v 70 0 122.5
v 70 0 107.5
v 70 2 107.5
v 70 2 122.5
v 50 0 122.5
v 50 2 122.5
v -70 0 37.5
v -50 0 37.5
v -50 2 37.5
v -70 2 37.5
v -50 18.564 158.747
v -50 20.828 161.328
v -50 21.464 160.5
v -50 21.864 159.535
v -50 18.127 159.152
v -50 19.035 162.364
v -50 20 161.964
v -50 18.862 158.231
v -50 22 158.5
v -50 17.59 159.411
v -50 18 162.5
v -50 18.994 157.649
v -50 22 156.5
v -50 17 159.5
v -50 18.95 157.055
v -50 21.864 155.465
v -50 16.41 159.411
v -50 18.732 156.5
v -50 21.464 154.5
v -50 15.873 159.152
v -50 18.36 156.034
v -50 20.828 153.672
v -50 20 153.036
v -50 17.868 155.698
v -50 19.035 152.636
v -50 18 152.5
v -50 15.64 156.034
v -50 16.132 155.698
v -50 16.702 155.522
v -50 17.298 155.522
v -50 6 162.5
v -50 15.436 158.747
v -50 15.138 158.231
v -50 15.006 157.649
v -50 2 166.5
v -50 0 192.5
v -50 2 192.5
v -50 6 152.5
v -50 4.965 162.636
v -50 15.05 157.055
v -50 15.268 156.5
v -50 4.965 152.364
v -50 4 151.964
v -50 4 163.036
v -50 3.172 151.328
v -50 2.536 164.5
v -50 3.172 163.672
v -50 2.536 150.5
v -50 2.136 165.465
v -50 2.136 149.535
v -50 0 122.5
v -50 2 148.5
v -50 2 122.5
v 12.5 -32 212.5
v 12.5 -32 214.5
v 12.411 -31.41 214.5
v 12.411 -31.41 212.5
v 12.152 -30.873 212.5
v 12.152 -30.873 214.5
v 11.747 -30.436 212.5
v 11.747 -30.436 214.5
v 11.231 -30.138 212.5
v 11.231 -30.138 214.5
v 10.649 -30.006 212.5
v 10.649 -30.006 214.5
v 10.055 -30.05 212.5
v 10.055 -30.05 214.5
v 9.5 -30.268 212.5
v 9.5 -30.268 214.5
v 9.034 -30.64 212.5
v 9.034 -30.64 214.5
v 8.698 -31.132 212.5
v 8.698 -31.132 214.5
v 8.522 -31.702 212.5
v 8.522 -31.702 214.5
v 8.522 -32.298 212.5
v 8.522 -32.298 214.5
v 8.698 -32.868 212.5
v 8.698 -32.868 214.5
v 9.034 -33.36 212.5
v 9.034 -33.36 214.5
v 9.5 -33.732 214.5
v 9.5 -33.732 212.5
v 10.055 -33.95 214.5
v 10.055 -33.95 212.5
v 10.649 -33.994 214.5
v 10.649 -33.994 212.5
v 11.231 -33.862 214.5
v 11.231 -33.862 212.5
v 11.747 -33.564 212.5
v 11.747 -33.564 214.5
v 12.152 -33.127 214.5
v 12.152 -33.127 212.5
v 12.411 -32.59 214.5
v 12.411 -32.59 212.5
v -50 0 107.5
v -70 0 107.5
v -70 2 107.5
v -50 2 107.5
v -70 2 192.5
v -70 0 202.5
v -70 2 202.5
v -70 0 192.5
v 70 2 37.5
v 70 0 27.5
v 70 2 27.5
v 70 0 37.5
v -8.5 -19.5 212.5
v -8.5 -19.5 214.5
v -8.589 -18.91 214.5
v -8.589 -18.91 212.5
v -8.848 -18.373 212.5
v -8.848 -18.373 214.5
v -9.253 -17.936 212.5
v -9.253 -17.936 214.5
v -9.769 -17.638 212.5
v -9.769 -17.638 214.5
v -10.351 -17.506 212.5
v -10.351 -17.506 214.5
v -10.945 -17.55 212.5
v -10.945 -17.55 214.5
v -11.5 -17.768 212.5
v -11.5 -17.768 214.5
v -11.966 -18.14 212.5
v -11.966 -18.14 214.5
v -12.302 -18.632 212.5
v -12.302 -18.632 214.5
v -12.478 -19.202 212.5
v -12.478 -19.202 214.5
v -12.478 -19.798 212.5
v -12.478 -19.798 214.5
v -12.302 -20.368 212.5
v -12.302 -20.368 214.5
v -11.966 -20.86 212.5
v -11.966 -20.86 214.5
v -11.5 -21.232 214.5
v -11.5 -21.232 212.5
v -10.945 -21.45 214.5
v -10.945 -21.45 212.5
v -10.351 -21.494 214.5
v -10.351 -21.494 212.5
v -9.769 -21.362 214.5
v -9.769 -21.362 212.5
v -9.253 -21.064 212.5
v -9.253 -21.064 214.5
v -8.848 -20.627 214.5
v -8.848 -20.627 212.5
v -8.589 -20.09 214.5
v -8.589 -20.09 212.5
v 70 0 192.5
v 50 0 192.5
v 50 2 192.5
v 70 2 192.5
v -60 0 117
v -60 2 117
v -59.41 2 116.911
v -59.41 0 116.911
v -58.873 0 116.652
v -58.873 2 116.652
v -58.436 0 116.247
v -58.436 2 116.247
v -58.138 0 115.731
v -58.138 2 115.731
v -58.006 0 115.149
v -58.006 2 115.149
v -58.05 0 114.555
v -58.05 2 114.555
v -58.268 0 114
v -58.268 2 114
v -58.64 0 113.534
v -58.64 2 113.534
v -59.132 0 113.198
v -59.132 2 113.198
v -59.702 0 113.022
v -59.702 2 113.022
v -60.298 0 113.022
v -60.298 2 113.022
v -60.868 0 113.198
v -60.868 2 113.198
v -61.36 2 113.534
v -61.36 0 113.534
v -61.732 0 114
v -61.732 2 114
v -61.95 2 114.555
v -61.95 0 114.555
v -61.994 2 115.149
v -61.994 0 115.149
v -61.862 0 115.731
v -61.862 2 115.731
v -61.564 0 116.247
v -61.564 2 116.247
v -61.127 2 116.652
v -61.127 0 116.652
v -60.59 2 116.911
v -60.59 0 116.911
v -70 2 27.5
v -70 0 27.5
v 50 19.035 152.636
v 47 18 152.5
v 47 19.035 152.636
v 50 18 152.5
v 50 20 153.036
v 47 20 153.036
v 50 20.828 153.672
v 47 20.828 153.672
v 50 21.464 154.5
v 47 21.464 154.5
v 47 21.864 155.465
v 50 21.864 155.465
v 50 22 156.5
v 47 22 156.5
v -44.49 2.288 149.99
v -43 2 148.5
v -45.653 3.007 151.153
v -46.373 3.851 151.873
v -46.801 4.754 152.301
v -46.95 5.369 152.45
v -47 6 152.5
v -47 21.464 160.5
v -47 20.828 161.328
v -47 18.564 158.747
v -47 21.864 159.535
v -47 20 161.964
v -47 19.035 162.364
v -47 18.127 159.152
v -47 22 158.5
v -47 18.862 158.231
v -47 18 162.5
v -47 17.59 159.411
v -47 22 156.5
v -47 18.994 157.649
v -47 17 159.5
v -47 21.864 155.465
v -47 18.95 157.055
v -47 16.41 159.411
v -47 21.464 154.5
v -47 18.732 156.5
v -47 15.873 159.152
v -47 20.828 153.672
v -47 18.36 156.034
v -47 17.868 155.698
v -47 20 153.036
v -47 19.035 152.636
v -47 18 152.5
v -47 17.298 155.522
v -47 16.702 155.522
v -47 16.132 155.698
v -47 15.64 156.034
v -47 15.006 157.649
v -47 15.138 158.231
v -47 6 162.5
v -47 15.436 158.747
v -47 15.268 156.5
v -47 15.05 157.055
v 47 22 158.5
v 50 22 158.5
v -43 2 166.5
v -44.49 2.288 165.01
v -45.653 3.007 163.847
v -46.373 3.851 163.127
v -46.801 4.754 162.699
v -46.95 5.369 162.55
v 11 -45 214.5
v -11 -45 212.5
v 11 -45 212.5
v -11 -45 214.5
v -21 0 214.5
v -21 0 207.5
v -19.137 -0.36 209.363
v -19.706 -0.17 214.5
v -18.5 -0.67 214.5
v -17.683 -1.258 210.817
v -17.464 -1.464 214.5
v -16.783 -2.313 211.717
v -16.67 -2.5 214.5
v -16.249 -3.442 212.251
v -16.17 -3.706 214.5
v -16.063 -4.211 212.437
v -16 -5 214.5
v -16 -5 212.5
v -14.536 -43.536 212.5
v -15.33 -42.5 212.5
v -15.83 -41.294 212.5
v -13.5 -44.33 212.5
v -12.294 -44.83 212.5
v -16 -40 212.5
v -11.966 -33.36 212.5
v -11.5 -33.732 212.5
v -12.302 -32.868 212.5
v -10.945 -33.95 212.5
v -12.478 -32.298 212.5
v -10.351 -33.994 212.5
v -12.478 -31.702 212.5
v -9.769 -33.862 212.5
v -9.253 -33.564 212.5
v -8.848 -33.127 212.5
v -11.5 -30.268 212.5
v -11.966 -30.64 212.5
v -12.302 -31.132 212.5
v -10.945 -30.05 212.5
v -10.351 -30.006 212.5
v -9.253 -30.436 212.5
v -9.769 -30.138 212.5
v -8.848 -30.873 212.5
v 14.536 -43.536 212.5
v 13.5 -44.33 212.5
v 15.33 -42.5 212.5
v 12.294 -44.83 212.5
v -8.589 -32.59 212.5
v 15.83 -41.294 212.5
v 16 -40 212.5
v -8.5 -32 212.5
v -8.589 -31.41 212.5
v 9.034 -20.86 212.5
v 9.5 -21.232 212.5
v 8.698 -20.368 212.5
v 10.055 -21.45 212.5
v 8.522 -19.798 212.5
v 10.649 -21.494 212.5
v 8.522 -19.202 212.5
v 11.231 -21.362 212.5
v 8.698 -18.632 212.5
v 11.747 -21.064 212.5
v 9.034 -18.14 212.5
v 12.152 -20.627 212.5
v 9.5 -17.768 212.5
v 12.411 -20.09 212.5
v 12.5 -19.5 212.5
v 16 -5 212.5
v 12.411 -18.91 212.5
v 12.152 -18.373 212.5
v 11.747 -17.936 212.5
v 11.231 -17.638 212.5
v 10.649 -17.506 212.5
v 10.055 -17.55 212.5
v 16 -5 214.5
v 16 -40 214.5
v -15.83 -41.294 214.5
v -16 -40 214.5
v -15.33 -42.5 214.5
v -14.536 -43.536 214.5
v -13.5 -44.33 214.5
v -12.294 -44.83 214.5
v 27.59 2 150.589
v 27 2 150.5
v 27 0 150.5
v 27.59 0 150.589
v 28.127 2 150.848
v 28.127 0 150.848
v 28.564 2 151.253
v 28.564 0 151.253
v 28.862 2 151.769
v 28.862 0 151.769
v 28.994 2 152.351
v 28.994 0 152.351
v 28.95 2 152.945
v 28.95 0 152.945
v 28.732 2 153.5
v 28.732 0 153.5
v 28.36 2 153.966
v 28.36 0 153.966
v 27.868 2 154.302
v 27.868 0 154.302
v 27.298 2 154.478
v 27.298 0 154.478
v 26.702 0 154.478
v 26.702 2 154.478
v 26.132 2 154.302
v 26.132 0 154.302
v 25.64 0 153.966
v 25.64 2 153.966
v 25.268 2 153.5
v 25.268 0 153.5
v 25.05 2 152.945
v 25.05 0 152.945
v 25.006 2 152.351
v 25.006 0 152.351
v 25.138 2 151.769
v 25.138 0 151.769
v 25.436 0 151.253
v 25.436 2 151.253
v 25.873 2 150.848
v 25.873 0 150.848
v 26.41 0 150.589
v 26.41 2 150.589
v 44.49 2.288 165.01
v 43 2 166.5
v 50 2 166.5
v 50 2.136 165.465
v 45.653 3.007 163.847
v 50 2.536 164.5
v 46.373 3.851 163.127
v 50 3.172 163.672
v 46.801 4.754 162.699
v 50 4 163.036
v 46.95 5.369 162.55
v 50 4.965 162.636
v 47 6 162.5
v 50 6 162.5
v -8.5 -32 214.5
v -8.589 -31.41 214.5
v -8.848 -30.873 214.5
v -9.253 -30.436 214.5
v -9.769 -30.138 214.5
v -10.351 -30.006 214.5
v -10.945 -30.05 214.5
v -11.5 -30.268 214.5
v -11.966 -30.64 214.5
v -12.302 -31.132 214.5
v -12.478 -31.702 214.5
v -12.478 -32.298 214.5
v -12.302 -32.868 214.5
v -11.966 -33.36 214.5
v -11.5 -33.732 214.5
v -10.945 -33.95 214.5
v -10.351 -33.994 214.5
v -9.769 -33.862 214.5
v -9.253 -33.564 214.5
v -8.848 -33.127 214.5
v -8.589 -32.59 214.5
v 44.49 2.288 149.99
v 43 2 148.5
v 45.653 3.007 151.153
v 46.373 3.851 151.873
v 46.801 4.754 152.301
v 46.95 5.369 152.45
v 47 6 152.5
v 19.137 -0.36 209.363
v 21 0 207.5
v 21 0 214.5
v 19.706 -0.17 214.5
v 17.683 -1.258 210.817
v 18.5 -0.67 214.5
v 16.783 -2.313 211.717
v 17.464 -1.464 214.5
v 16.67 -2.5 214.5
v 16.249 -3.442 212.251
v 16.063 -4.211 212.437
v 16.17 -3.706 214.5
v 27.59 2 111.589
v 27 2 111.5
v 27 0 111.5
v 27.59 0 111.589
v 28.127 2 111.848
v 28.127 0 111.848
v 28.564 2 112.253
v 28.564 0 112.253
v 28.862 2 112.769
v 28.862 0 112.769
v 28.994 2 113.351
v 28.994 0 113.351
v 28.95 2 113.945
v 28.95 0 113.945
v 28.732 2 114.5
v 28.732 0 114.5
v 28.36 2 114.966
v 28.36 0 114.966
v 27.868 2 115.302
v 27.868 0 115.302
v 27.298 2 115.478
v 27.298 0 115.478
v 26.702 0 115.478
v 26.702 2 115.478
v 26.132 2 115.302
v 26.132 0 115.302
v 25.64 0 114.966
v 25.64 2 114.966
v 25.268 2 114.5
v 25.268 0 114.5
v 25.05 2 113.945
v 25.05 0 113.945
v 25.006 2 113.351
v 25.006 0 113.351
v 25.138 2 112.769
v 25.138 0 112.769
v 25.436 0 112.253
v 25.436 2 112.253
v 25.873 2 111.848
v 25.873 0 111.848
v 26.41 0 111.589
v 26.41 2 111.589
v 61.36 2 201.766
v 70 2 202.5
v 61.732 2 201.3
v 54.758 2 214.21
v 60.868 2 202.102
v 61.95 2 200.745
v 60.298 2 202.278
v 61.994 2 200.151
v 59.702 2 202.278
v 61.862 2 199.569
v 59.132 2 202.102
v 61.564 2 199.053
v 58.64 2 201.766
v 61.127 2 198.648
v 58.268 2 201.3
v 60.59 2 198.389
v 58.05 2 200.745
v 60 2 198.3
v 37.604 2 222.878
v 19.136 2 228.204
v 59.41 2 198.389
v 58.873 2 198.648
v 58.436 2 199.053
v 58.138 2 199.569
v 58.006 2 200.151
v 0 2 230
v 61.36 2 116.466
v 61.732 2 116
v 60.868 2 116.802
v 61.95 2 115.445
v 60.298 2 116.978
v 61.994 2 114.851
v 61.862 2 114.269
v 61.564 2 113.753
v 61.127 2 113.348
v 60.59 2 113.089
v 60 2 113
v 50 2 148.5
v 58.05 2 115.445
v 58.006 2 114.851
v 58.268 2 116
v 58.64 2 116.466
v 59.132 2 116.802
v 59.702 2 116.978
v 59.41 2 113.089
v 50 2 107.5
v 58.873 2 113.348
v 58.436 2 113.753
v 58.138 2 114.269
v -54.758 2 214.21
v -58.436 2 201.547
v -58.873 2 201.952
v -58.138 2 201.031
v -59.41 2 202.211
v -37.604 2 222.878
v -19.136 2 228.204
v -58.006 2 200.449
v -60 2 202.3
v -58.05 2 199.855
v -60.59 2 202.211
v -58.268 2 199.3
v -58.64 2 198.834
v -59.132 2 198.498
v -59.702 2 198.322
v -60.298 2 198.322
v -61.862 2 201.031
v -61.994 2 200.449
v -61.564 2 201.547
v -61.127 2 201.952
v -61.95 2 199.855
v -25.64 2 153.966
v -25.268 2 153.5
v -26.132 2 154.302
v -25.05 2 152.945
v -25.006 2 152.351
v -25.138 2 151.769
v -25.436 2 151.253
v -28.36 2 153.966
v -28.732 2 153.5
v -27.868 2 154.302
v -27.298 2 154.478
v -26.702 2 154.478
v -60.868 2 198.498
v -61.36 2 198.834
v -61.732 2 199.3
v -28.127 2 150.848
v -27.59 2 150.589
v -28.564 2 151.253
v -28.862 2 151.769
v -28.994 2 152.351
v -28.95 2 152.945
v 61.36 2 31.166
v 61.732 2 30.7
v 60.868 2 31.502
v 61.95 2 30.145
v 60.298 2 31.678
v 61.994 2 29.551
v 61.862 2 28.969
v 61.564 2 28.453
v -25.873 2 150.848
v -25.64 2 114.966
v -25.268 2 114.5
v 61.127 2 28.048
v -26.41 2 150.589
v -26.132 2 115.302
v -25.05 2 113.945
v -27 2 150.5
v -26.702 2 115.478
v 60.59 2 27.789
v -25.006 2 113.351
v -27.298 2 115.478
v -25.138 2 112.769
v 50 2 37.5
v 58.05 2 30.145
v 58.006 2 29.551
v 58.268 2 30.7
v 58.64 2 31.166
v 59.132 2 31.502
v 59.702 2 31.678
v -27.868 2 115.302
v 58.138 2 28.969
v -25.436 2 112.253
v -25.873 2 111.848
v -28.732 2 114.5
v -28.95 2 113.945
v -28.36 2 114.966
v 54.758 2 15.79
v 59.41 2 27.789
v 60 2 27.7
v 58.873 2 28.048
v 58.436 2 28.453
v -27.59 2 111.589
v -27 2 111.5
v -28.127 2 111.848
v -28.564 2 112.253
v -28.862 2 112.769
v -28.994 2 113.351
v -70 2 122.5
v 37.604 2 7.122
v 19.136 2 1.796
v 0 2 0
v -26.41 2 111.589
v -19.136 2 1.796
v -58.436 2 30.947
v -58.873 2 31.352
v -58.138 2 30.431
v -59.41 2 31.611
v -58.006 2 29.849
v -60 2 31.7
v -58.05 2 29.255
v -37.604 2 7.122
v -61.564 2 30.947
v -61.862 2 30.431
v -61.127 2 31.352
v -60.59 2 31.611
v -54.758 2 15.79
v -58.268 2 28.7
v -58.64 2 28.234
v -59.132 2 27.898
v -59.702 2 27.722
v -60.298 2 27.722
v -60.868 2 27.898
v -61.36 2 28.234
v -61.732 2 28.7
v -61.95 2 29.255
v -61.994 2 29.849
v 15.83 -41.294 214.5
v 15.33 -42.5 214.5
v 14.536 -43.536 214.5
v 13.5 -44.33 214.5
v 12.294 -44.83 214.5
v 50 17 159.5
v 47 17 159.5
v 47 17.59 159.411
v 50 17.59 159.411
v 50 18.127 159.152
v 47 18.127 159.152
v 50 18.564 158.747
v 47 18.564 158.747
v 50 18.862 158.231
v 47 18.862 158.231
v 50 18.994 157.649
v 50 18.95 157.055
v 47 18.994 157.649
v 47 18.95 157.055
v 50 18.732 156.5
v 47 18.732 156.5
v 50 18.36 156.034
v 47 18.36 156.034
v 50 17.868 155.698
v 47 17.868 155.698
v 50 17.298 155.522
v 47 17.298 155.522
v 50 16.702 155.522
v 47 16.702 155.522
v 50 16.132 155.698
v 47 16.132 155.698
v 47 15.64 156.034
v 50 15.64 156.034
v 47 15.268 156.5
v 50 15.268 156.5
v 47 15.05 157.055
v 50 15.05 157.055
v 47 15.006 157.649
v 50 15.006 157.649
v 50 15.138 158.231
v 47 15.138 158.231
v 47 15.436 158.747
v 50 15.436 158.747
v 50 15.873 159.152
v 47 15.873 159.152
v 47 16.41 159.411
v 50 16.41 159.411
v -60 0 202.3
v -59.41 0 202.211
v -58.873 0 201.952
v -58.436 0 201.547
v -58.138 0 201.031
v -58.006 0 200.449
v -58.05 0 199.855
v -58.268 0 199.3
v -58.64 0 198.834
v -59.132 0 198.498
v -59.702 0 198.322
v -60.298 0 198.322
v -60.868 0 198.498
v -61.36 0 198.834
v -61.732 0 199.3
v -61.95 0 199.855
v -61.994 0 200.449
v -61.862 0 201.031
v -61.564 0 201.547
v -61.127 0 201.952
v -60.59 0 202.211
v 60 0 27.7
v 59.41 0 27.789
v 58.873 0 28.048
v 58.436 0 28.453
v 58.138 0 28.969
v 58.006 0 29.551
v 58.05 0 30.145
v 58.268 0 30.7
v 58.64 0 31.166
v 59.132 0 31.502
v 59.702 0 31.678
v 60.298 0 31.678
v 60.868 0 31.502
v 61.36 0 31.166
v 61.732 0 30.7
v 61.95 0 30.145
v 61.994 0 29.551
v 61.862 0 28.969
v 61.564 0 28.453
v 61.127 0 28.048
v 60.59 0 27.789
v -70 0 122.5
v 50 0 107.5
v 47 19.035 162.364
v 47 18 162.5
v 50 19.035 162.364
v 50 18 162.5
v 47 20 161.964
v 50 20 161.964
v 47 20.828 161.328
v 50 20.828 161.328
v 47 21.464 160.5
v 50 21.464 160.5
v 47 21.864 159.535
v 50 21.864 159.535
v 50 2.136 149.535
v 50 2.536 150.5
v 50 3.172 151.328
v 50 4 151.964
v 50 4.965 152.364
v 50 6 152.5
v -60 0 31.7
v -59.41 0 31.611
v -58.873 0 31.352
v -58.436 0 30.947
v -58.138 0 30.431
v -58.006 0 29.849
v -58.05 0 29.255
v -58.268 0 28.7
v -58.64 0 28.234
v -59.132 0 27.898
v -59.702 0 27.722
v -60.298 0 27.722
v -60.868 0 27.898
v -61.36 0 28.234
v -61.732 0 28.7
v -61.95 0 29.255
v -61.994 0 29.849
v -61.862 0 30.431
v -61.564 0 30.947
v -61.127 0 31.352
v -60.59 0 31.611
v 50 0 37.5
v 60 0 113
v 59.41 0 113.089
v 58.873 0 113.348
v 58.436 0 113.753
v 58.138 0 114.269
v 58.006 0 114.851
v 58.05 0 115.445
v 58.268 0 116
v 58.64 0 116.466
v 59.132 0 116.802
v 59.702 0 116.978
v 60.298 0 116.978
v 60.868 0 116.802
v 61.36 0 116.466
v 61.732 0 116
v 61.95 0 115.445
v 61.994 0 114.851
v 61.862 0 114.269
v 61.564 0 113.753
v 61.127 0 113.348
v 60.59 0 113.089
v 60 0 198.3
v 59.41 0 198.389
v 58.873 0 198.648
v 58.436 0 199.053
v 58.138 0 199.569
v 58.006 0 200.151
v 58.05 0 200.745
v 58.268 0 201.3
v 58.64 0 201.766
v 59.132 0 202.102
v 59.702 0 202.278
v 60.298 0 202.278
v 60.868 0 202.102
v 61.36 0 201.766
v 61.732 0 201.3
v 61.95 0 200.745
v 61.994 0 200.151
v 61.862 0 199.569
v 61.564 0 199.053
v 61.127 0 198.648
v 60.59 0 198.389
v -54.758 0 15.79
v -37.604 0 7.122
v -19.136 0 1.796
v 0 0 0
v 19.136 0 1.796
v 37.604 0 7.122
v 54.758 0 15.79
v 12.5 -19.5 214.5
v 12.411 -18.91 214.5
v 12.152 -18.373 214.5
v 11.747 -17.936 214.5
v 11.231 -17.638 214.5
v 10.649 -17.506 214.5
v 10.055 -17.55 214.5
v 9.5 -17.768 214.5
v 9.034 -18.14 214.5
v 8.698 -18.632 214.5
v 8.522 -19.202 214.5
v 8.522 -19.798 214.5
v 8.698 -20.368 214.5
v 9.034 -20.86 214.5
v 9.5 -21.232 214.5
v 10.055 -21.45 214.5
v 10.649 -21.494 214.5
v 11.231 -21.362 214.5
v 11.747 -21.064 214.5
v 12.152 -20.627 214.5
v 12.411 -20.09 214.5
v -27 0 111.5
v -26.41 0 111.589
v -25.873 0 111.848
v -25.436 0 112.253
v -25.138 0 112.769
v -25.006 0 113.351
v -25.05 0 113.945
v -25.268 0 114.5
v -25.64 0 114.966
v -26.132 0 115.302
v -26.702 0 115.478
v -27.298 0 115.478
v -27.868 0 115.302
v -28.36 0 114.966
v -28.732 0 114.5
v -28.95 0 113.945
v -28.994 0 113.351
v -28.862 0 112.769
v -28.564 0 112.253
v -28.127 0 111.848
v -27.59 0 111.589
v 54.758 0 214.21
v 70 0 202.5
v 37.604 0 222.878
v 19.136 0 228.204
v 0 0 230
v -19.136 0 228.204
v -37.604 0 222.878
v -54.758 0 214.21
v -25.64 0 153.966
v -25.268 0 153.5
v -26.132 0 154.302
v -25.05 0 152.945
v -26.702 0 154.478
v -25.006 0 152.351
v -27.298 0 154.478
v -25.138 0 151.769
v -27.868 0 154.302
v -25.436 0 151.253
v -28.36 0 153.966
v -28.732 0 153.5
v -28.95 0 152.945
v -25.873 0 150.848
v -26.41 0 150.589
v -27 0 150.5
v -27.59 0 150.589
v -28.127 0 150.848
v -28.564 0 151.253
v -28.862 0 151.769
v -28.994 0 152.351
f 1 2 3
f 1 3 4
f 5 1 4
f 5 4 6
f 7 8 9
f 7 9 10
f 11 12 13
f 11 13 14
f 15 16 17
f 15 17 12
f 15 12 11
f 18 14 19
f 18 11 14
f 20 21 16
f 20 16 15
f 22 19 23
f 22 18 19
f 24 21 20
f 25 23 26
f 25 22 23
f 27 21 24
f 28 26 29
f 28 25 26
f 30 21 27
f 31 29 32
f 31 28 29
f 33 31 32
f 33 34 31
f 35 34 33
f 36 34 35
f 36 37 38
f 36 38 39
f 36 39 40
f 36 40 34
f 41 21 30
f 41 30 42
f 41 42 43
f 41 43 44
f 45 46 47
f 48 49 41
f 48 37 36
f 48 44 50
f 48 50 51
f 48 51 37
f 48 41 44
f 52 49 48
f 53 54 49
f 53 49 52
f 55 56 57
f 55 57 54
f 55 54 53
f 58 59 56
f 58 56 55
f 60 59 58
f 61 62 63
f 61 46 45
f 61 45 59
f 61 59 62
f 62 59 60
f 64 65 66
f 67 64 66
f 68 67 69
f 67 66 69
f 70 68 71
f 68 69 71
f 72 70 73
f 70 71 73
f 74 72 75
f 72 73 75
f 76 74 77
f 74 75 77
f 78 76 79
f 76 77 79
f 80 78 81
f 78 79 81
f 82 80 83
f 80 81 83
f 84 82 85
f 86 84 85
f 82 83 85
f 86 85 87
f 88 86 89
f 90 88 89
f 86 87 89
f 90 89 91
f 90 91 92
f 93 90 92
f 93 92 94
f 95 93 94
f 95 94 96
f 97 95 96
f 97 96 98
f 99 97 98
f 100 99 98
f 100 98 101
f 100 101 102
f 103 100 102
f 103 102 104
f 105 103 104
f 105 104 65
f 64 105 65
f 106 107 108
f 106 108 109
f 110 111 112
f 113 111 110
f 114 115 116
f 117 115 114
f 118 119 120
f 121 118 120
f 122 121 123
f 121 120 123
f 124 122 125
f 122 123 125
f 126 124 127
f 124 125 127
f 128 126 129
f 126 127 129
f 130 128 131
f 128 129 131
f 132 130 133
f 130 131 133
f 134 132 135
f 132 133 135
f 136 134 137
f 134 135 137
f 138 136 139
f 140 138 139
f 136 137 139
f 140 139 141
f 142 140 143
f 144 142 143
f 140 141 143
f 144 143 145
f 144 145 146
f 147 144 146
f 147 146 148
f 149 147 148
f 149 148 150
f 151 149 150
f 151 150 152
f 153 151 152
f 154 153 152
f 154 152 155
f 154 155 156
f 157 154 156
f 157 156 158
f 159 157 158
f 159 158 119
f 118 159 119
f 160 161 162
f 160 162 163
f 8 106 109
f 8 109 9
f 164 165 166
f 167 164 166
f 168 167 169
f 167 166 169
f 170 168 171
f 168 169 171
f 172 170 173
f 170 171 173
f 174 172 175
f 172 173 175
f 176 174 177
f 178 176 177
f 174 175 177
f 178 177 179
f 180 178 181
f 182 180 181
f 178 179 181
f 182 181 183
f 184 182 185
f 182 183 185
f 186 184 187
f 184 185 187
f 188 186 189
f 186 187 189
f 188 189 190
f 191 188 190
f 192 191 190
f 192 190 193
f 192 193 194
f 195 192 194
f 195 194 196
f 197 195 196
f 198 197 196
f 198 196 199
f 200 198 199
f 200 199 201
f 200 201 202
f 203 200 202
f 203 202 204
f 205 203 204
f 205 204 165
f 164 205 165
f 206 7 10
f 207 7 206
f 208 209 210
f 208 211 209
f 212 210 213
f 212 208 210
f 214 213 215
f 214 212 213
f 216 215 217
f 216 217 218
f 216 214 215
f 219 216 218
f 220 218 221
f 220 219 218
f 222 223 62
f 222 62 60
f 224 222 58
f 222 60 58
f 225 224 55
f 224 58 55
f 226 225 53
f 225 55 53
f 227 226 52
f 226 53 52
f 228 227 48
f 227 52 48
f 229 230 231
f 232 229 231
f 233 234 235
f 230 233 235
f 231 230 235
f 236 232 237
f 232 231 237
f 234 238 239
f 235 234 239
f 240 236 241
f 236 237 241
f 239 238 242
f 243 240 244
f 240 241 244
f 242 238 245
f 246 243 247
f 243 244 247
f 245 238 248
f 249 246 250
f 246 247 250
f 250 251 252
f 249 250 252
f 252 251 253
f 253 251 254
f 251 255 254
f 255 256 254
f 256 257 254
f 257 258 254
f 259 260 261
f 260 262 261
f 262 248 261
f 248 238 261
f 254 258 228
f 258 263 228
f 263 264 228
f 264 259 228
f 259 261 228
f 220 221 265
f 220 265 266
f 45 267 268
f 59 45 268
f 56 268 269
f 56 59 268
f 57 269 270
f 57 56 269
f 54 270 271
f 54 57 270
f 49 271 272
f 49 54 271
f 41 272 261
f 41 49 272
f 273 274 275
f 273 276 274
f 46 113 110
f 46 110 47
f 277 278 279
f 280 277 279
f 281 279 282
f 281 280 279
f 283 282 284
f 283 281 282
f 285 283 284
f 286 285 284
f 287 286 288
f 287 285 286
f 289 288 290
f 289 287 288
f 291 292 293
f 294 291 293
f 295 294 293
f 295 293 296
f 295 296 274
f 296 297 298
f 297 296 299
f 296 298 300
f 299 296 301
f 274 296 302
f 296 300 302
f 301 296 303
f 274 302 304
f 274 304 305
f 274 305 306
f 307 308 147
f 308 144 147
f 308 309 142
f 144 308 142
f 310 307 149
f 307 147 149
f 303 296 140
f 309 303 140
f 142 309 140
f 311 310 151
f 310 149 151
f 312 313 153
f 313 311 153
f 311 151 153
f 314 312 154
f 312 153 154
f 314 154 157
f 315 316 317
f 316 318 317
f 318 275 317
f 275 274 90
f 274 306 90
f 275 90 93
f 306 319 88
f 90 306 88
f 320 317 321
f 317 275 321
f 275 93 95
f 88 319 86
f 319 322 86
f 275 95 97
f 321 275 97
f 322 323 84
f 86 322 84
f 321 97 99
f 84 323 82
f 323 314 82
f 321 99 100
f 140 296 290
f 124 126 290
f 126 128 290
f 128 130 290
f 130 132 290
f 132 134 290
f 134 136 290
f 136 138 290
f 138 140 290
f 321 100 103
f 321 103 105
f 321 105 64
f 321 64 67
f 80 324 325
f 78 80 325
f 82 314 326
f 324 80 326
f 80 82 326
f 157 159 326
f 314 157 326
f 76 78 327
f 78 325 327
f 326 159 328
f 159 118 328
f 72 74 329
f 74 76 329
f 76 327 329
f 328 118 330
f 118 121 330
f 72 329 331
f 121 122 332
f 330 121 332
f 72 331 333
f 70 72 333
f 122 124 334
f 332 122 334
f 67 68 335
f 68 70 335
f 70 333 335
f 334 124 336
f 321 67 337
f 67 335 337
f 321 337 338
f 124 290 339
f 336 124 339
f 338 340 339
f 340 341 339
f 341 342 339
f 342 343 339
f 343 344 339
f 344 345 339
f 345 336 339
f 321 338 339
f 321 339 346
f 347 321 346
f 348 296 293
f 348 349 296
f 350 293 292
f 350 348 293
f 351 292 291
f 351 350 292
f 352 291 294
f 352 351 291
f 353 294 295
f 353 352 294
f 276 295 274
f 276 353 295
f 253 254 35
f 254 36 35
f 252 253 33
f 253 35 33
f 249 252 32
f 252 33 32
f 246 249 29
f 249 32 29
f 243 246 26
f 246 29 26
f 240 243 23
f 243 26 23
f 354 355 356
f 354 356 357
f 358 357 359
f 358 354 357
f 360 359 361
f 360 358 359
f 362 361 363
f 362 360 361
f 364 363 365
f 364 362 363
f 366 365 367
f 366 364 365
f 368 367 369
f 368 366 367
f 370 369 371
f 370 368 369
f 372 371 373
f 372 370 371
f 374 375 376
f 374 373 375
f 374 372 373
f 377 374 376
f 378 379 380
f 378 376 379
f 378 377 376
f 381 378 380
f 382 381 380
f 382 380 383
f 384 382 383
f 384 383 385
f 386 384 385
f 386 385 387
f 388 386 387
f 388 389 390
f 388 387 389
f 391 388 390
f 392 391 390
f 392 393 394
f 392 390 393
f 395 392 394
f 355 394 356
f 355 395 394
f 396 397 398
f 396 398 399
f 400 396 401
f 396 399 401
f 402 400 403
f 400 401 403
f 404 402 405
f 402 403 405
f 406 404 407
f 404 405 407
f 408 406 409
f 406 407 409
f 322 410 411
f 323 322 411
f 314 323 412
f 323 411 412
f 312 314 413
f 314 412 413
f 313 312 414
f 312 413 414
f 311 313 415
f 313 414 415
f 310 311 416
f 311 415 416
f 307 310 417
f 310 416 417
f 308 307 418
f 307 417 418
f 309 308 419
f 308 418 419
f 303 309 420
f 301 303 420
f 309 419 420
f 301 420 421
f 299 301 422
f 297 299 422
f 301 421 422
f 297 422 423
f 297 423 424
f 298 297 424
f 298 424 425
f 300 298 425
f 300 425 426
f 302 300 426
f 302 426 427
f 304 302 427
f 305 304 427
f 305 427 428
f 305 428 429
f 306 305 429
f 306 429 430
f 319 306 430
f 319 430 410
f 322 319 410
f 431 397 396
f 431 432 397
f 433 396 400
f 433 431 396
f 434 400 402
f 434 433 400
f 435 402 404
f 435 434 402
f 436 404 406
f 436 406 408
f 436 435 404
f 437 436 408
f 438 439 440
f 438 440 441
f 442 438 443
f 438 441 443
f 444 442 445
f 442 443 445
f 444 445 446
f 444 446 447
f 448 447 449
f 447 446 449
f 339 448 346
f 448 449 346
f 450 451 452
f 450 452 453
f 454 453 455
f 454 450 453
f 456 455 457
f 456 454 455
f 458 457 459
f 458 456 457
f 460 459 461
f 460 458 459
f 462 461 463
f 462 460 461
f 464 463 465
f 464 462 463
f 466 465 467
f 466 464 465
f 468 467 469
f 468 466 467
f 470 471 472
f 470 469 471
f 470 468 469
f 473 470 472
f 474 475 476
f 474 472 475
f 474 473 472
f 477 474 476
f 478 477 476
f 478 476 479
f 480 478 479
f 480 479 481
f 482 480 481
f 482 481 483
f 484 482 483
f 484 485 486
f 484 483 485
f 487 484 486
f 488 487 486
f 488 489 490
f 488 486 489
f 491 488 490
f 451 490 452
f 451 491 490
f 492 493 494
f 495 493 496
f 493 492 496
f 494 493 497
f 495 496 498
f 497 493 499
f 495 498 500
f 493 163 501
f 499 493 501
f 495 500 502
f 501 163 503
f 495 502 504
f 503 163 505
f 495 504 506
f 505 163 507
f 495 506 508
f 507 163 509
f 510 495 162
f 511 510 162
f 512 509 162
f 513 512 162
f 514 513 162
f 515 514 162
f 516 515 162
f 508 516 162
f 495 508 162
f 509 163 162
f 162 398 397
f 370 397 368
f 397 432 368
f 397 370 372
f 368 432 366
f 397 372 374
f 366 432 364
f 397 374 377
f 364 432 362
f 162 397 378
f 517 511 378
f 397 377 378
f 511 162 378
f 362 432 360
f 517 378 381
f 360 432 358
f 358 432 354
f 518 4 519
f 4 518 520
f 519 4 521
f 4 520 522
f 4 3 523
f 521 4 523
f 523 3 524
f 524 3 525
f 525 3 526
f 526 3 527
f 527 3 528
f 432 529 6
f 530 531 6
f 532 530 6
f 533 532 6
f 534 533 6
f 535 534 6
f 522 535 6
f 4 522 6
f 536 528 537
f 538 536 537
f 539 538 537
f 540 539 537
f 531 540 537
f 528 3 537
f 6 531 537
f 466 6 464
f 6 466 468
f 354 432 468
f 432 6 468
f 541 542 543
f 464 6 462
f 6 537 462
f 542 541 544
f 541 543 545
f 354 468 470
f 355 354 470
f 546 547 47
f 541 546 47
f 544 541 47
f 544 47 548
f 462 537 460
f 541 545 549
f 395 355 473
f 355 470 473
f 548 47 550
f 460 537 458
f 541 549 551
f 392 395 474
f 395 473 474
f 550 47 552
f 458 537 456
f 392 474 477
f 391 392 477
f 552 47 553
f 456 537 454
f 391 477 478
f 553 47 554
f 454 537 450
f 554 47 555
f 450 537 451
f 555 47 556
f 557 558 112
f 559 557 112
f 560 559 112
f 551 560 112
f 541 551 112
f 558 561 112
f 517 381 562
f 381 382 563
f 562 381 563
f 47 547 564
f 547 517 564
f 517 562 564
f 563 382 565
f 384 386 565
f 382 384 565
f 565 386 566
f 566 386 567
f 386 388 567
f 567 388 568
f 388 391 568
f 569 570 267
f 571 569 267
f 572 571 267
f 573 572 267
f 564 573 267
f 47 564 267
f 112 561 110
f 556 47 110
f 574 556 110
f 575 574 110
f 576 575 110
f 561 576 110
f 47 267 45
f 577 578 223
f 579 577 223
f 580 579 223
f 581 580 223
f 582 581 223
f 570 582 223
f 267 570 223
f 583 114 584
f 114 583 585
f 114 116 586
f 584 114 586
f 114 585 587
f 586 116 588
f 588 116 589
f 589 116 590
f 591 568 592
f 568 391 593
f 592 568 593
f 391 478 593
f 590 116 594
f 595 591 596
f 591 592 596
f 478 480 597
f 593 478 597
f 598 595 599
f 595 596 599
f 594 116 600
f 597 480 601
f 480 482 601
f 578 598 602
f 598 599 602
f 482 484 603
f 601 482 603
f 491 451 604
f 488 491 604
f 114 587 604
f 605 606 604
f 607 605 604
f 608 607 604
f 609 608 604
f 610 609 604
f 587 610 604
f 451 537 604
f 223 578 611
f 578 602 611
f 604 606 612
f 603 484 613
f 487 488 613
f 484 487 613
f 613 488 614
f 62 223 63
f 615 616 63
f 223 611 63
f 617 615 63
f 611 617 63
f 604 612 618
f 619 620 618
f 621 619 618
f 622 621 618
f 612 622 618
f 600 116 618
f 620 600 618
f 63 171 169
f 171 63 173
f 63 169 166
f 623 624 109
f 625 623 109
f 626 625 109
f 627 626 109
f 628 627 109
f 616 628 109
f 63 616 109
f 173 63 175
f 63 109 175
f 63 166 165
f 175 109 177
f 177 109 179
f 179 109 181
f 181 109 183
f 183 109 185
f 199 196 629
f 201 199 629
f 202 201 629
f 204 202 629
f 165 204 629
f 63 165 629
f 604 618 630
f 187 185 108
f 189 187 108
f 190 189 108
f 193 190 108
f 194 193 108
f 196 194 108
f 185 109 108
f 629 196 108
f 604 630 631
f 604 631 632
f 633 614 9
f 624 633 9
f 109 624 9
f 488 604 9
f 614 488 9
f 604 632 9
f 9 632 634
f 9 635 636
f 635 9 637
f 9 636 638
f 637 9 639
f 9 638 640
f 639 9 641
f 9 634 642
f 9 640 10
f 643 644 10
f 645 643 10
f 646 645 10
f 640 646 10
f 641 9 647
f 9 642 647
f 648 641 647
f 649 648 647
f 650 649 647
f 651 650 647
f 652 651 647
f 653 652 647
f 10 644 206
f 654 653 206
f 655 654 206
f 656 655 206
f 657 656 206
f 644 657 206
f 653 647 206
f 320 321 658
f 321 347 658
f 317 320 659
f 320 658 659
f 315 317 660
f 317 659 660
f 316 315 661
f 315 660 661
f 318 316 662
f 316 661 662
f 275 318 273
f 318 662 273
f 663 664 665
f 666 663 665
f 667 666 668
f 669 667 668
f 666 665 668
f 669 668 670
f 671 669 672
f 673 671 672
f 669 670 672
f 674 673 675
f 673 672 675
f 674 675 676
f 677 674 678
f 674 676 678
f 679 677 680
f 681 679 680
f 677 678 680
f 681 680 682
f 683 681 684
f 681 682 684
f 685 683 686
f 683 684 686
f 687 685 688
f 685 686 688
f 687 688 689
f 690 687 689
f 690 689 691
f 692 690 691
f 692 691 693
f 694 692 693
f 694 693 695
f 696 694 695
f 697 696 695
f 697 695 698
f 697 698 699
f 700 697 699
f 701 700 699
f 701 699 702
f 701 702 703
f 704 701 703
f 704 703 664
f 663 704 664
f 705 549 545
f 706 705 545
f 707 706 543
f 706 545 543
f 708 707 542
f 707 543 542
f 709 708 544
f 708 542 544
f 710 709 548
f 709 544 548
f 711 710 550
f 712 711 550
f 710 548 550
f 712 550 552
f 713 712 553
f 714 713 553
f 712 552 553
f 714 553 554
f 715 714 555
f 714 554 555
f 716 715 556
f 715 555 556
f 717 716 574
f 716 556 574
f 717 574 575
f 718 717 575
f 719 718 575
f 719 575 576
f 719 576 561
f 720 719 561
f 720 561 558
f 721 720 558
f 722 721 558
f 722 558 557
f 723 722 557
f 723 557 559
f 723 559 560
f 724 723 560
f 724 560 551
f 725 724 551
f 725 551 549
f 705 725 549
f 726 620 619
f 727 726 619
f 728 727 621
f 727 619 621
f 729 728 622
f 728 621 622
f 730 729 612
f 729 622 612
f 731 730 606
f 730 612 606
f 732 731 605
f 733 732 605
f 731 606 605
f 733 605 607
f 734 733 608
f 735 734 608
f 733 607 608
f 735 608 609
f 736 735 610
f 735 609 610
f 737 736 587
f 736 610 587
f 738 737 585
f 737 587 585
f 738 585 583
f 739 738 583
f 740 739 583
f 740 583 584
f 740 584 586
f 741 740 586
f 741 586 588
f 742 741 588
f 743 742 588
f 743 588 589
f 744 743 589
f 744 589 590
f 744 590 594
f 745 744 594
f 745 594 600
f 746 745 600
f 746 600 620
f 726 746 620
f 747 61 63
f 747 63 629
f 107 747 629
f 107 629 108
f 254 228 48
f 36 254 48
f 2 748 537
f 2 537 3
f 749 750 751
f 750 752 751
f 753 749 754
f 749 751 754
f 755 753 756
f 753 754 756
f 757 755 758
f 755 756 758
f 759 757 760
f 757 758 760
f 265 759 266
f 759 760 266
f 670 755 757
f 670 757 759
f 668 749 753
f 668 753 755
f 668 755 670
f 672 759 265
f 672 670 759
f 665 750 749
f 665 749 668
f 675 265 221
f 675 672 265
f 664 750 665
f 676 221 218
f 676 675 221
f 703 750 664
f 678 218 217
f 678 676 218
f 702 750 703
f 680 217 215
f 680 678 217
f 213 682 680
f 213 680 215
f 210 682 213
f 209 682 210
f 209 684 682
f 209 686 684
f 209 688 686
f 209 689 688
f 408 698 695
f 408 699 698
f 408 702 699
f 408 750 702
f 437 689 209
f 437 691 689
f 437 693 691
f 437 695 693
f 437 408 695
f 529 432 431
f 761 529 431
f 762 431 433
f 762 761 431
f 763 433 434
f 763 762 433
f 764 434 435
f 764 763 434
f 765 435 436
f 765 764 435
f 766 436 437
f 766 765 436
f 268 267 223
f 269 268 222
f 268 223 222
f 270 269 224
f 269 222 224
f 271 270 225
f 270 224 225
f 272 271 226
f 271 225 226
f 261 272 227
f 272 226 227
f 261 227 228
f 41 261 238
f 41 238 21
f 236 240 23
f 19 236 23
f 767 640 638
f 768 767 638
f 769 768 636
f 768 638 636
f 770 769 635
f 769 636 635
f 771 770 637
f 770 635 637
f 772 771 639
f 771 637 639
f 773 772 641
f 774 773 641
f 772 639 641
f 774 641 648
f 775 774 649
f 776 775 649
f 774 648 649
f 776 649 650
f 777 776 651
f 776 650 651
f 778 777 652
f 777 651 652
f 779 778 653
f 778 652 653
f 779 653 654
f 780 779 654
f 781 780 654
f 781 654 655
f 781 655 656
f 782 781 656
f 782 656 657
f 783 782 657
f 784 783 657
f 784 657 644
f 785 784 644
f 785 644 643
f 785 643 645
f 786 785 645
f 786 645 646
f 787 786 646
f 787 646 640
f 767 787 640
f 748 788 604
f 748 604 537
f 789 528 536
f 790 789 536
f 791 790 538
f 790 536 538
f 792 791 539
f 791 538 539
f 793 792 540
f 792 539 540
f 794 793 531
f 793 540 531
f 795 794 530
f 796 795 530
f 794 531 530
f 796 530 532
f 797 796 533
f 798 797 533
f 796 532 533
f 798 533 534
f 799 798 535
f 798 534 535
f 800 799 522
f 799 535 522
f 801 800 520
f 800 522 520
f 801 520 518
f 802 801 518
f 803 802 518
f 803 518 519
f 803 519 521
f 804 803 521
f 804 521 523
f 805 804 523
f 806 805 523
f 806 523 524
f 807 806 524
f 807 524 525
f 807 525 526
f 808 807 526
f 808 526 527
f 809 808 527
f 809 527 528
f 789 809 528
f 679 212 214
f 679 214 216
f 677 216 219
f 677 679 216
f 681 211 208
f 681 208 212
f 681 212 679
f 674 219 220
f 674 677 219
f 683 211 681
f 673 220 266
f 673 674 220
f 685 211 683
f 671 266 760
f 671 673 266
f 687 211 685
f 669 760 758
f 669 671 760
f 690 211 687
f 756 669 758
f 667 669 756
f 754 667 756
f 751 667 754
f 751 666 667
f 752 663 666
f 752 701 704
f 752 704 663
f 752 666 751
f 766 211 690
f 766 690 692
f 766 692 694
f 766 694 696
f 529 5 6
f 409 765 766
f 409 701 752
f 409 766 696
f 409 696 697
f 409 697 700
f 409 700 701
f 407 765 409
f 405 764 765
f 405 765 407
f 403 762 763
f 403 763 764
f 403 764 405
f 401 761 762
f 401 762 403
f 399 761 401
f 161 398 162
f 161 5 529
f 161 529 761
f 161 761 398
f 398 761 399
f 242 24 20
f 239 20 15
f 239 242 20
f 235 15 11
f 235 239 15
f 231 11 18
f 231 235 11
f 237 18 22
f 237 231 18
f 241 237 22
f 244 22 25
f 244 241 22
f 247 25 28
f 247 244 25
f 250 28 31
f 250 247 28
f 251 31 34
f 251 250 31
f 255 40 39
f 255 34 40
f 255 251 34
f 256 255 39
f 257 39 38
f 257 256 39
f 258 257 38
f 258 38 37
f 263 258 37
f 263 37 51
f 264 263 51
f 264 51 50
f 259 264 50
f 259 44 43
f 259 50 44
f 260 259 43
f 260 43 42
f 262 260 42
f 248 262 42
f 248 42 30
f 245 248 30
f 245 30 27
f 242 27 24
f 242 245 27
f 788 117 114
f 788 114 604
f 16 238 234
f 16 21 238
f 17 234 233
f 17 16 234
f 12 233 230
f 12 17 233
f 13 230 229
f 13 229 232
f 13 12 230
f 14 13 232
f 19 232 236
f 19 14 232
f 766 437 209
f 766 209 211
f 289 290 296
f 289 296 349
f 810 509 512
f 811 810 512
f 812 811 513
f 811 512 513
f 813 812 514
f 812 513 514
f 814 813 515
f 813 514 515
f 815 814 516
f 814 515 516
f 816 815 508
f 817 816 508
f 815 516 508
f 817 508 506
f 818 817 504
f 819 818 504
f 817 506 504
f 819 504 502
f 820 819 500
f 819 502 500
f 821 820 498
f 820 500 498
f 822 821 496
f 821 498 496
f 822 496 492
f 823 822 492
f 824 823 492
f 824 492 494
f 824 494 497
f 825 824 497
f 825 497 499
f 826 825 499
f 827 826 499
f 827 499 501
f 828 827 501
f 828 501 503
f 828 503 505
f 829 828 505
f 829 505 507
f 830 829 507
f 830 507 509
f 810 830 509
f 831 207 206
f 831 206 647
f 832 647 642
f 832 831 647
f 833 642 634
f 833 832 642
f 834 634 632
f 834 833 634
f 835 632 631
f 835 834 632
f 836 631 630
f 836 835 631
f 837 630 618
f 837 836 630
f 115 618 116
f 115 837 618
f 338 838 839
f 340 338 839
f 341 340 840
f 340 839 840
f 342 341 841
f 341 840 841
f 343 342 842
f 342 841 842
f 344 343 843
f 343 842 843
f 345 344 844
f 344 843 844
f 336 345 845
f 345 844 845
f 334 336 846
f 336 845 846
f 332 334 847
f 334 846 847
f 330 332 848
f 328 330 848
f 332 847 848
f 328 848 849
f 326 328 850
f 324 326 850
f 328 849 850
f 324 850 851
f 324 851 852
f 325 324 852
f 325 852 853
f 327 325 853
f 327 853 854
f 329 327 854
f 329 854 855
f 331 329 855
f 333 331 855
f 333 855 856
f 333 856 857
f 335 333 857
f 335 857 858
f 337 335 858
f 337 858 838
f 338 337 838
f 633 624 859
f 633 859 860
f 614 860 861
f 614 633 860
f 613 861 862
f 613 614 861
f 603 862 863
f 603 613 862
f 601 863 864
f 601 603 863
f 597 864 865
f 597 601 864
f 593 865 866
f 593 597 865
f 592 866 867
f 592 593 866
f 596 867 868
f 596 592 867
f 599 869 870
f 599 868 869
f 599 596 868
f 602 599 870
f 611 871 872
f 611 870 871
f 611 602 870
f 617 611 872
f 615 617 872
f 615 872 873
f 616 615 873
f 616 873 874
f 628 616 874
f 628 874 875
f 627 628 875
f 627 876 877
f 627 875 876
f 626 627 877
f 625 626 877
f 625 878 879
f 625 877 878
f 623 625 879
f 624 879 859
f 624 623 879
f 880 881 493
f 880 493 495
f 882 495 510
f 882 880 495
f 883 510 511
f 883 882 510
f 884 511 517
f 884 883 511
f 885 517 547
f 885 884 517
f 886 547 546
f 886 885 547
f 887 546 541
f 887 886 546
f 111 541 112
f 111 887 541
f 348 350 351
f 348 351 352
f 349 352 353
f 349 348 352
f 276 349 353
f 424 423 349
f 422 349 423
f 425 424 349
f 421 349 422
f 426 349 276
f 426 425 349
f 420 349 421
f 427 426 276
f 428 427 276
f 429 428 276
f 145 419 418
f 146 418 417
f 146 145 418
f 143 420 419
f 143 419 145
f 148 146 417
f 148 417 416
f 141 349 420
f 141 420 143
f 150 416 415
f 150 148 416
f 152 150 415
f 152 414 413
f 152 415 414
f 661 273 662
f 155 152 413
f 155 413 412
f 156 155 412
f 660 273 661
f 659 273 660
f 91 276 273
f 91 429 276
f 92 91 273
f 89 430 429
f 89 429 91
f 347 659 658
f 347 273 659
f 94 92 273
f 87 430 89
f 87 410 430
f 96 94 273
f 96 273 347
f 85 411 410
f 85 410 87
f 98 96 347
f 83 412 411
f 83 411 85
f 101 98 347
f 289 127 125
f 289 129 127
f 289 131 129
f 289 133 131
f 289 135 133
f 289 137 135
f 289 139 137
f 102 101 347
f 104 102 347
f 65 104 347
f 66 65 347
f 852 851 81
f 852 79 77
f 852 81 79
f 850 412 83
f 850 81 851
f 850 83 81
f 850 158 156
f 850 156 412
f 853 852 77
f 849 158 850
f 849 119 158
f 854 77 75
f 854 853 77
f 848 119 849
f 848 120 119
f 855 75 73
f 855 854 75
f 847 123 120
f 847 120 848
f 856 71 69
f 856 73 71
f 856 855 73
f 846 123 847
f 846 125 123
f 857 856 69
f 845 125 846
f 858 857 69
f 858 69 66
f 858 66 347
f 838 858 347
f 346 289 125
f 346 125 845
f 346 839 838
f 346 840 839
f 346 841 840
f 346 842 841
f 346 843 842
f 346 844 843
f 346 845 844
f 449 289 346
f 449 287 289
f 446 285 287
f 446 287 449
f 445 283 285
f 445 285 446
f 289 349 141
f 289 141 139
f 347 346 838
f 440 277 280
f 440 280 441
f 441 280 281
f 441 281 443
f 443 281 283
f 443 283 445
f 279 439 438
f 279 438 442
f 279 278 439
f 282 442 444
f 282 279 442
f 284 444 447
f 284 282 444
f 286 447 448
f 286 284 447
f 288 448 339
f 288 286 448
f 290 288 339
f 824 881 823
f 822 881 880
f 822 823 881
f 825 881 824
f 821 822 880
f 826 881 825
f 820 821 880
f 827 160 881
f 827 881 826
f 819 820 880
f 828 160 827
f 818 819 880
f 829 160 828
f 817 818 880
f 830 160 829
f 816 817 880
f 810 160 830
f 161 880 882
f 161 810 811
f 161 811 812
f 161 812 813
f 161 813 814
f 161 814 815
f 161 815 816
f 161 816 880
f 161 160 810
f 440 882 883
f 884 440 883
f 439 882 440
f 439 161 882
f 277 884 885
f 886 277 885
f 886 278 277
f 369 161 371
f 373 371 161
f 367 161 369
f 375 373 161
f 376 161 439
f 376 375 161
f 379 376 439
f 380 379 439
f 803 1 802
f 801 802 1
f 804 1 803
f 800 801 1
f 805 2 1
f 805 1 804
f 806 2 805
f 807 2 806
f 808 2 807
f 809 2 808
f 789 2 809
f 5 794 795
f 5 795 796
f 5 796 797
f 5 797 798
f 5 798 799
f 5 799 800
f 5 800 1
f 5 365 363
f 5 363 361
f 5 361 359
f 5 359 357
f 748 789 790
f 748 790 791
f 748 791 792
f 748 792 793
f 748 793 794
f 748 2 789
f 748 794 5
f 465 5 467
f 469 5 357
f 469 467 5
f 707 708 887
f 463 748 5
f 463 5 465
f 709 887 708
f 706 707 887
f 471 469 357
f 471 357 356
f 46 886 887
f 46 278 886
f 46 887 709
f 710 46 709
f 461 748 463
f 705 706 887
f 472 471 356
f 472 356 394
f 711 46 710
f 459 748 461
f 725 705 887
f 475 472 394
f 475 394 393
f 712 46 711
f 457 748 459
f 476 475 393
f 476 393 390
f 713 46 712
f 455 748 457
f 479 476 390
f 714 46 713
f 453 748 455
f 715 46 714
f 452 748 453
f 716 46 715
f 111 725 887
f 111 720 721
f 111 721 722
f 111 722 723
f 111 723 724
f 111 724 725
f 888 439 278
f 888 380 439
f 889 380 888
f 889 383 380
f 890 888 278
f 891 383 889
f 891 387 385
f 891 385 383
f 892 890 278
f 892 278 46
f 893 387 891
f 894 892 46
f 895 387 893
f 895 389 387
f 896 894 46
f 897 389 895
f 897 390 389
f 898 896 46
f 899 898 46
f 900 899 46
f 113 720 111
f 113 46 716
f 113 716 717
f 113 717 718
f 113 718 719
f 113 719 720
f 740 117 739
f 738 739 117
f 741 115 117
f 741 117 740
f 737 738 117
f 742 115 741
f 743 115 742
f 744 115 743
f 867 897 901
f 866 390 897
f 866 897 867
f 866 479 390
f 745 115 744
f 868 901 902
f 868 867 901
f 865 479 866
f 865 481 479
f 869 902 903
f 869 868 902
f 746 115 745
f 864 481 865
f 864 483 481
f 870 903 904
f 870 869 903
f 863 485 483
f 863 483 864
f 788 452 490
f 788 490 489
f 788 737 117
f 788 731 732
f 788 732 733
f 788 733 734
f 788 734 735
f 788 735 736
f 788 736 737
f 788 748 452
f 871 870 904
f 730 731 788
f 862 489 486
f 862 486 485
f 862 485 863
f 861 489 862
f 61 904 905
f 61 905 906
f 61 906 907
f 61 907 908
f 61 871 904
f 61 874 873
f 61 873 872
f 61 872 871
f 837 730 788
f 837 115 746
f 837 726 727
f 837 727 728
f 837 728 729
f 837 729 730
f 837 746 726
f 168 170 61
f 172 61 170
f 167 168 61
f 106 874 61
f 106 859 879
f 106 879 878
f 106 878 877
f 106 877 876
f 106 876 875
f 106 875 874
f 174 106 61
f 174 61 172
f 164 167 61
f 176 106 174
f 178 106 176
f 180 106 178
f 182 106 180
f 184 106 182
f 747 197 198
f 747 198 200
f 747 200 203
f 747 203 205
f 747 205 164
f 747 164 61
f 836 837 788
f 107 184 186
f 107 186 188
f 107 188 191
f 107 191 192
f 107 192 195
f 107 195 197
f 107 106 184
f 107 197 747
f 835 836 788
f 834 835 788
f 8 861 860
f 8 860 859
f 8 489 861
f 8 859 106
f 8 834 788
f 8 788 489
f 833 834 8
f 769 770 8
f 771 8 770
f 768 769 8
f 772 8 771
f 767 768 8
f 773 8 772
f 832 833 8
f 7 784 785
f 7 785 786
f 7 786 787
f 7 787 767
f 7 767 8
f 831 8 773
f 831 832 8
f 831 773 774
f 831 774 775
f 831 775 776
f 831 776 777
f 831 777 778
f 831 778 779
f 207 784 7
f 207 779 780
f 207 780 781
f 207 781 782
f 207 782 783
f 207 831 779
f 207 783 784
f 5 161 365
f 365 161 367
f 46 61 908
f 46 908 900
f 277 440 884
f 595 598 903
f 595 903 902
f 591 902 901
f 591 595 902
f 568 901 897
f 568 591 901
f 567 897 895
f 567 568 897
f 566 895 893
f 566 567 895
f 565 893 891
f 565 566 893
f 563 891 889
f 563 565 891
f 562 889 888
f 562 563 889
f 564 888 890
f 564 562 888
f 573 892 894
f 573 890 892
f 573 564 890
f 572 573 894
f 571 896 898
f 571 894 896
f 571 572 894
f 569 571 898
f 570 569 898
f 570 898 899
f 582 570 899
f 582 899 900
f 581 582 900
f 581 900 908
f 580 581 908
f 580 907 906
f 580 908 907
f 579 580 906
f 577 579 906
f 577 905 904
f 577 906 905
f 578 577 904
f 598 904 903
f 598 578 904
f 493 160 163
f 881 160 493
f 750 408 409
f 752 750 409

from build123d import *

# Parameters (mm, degrees)
BOSS_EXTRUDE1_DEPTH     = 2
SKETCH3_W               = 3
SKETCH3_H               = 10
BOSS_EXTRUDE2_DEPTH     = 20
SKETCH4_R               = 2
CUT_EXTRUDE2_DEPTH      = 259.984555524
FILLET1_R               = 4
FILLET1_OF_MIRROR1_R    = 4
SKETCH5_R               = 2
CUT_EXTRUDE3_DEPTH      = 242.246761636
CUT_EXTRUDE4_DEPTH      = 242.420794465
CUT_EXTRUDE4_DEPTH_BACK = 242.420794465
SKETCH6_R               = 2
SKETCH7_W               = 32
SKETCH7_H               = 2
BOSS_EXTRUDE3_DEPTH     = 45
FILLET3_R               = 5
FILLET4_R               = 5
SKETCH8_R               = 2
CUT_EXTRUDE5_DEPTH      = 231.076617673


with BuildPart() as part:
    # Sketch1 → Boss-Extrude1 (new body)
    with BuildSketch(Plane(origin=(0, 0, 0), x_dir=(1, 0, 0), z_dir=(0, 1, 0))):
        with BuildLine():
            Line((70, -27.5), (70, -37.5))
            Line((70, -37.5), (50, -37.5))
            Line((50, -37.5), (50, -107.5))
            Line((50, -107.5), (70, -107.5))
            Line((70, -107.5), (70, -122.5))
            Line((70, -122.5), (50, -122.5))
            Line((50, -122.5), (50, -192.5))
            Line((50, -192.5), (70, -192.5))
            Line((70, -192.5), (70, -202.5))
            ThreePointArc((70, -202.5), (0, -230), (-70, -202.5))
            Line((-70, -202.5), (-70, -192.5))
            Line((-70, -192.5), (-50, -192.5))
            Line((-50, -192.5), (-50, -122.5))
            Line((-50, -122.5), (-70, -122.5))
            Line((-70, -122.5), (-70, -107.5))
            Line((-70, -107.5), (-50, -107.5))
            Line((-50, -107.5), (-50, -37.5))
            Line((-50, -37.5), (-70, -37.5))
            Line((-70, -37.5), (-70, -27.5))
            ThreePointArc((-70, -27.5), (0, 0), (70, -27.5))
        make_face()
    extrude(amount=BOSS_EXTRUDE1_DEPTH)

    # Sketch3 → Boss-Extrude2 (add)
    with BuildSketch(Plane(origin=(0, 2, 0), x_dir=(1, 0, 0), z_dir=(0, 1, 0))):
        with Locations((48.5, -157.5)):
            Rectangle(SKETCH3_W, SKETCH3_H)
    boss_extrude2 = extrude(amount=BOSS_EXTRUDE2_DEPTH)

    # Sketch4 → Cut-Extrude2 (cut, through all)
    with BuildSketch(Plane.ZY.offset(-47)):
        with Locations((157.5, 17)):
            Circle(SKETCH4_R)
    cut_extrude2 = extrude(amount=-CUT_EXTRUDE2_DEPTH, mode=Mode.SUBTRACT)

    # Fillet1
    fillet1_edges = [part.edges().sort_by_distance(p)[0] for p in [
        (47, 2, 157.5),
        (48.5, 2, 162.5),
        (48.5, 2, 152.5),
        (48.5, 22, 162.5),
        (48.5, 22, 152.5),
    ]]
    fillet(fillet1_edges, radius=FILLET1_R)

    # Mirror1: Boss-Extrude2, Cut-Extrude2 across plane
    add(boss_extrude2.mirror(Plane(origin=(0, 0, 0), x_dir=(0, 0, 1), z_dir=(1, 0, 0))))
    add(cut_extrude2.mirror(Plane(origin=(0, 0, 0), x_dir=(0, 0, 1), z_dir=(1, 0, 0))), mode=Mode.SUBTRACT)

    # Fillet1 of Mirror1
    fillet1_of_mirror1_edges = [part.edges().sort_by_distance(p)[0] for p in [
        (-47, 2, 157.5),
        (-48.5, 2, 162.5),
        (-48.5, 2, 152.5),
        (-48.5, 22, 162.5),
        (-48.5, 22, 152.5),
    ]]
    fillet(fillet1_of_mirror1_edges, radius=FILLET1_OF_MIRROR1_R)

    # Sketch5 → Cut-Extrude3 (cut, through all)
    with BuildSketch(Plane(origin=(0, 2, 0), x_dir=(1, 0, 0), z_dir=(0, 1, 0))):
        with Locations(Location((-60, -115, 0), (0, 0, 270))):
            Circle(SKETCH5_R)
        with Locations(Location((-60, -200.3, 0), (0, 0, 270))):
            Circle(SKETCH5_R)
        with Locations(Location((-60, -29.7, 0), (0, 0, 270))):
            Circle(SKETCH5_R)
        with Locations(Location((60, -200.3, 0), (0, 0, 90))):
            Circle(SKETCH5_R)
        with Locations(Location((60, -115, 0), (0, 0, 90))):
            Circle(SKETCH5_R)
        with Locations(Location((60, -29.7, 0), (0, 0, 90))):
            Circle(SKETCH5_R)
    extrude(amount=-CUT_EXTRUDE3_DEPTH, mode=Mode.SUBTRACT)

    # Sketch6 → Cut-Extrude4 (cut, two sides: drawn at the far end of the back side and taken through both)
    with BuildSketch(Plane.XZ.offset(-CUT_EXTRUDE4_DEPTH_BACK)):
        with Locations(Location((-27, 152.5, 0), (0, 0, 270))):
            Circle(SKETCH6_R)
        with Locations(Location((27, 152.5, 0), (0, 0, 270))):
            Circle(SKETCH6_R)
        with Locations(Location((-27, 113.5, 0), (0, 0, 270))):
            Circle(SKETCH6_R)
        with Locations(Location((27, 113.5, 0), (0, 0, 270))):
            Circle(SKETCH6_R)
    extrude(amount=CUT_EXTRUDE4_DEPTH + CUT_EXTRUDE4_DEPTH_BACK, mode=Mode.SUBTRACT)

    # Sketch7 → Boss-Extrude3 (add)
    with BuildSketch(Plane.XZ):
        with Locations((0, 213.5)):
            Rectangle(SKETCH7_W, SKETCH7_H)
    extrude(amount=BOSS_EXTRUDE3_DEPTH)

    # Fillet3
    fillet3_edges = [part.edges().sort_by_distance(p)[0] for p in [
        (-16, 0, 213.5),
        (16, 0, 213.5),
        (-16, -45, 213.5),
        (16, -45, 213.5),
    ]]
    fillet(fillet3_edges, radius=FILLET3_R)

    # Fillet4
    fillet4_edges = [part.edges().sort_by_distance(p)[0] for p in [
        (0, 0, 212.5),
    ]]
    fillet(fillet4_edges, radius=FILLET4_R)

    # Sketch8 → Cut-Extrude5 (cut, through all)
    with BuildSketch(Plane.XY.offset(214.5)):
        with Locations((-10.5, -19.5)):
            Circle(SKETCH8_R)
        with Locations((10.5, -19.5)):
            Circle(SKETCH8_R)
        with Locations((10.5, -32)):
            Circle(SKETCH8_R)
        with Locations((-10.5, -32)):
            Circle(SKETCH8_R)
    extrude(amount=-CUT_EXTRUDE5_DEPTH, mode=Mode.SUBTRACT)


solid = part.part
